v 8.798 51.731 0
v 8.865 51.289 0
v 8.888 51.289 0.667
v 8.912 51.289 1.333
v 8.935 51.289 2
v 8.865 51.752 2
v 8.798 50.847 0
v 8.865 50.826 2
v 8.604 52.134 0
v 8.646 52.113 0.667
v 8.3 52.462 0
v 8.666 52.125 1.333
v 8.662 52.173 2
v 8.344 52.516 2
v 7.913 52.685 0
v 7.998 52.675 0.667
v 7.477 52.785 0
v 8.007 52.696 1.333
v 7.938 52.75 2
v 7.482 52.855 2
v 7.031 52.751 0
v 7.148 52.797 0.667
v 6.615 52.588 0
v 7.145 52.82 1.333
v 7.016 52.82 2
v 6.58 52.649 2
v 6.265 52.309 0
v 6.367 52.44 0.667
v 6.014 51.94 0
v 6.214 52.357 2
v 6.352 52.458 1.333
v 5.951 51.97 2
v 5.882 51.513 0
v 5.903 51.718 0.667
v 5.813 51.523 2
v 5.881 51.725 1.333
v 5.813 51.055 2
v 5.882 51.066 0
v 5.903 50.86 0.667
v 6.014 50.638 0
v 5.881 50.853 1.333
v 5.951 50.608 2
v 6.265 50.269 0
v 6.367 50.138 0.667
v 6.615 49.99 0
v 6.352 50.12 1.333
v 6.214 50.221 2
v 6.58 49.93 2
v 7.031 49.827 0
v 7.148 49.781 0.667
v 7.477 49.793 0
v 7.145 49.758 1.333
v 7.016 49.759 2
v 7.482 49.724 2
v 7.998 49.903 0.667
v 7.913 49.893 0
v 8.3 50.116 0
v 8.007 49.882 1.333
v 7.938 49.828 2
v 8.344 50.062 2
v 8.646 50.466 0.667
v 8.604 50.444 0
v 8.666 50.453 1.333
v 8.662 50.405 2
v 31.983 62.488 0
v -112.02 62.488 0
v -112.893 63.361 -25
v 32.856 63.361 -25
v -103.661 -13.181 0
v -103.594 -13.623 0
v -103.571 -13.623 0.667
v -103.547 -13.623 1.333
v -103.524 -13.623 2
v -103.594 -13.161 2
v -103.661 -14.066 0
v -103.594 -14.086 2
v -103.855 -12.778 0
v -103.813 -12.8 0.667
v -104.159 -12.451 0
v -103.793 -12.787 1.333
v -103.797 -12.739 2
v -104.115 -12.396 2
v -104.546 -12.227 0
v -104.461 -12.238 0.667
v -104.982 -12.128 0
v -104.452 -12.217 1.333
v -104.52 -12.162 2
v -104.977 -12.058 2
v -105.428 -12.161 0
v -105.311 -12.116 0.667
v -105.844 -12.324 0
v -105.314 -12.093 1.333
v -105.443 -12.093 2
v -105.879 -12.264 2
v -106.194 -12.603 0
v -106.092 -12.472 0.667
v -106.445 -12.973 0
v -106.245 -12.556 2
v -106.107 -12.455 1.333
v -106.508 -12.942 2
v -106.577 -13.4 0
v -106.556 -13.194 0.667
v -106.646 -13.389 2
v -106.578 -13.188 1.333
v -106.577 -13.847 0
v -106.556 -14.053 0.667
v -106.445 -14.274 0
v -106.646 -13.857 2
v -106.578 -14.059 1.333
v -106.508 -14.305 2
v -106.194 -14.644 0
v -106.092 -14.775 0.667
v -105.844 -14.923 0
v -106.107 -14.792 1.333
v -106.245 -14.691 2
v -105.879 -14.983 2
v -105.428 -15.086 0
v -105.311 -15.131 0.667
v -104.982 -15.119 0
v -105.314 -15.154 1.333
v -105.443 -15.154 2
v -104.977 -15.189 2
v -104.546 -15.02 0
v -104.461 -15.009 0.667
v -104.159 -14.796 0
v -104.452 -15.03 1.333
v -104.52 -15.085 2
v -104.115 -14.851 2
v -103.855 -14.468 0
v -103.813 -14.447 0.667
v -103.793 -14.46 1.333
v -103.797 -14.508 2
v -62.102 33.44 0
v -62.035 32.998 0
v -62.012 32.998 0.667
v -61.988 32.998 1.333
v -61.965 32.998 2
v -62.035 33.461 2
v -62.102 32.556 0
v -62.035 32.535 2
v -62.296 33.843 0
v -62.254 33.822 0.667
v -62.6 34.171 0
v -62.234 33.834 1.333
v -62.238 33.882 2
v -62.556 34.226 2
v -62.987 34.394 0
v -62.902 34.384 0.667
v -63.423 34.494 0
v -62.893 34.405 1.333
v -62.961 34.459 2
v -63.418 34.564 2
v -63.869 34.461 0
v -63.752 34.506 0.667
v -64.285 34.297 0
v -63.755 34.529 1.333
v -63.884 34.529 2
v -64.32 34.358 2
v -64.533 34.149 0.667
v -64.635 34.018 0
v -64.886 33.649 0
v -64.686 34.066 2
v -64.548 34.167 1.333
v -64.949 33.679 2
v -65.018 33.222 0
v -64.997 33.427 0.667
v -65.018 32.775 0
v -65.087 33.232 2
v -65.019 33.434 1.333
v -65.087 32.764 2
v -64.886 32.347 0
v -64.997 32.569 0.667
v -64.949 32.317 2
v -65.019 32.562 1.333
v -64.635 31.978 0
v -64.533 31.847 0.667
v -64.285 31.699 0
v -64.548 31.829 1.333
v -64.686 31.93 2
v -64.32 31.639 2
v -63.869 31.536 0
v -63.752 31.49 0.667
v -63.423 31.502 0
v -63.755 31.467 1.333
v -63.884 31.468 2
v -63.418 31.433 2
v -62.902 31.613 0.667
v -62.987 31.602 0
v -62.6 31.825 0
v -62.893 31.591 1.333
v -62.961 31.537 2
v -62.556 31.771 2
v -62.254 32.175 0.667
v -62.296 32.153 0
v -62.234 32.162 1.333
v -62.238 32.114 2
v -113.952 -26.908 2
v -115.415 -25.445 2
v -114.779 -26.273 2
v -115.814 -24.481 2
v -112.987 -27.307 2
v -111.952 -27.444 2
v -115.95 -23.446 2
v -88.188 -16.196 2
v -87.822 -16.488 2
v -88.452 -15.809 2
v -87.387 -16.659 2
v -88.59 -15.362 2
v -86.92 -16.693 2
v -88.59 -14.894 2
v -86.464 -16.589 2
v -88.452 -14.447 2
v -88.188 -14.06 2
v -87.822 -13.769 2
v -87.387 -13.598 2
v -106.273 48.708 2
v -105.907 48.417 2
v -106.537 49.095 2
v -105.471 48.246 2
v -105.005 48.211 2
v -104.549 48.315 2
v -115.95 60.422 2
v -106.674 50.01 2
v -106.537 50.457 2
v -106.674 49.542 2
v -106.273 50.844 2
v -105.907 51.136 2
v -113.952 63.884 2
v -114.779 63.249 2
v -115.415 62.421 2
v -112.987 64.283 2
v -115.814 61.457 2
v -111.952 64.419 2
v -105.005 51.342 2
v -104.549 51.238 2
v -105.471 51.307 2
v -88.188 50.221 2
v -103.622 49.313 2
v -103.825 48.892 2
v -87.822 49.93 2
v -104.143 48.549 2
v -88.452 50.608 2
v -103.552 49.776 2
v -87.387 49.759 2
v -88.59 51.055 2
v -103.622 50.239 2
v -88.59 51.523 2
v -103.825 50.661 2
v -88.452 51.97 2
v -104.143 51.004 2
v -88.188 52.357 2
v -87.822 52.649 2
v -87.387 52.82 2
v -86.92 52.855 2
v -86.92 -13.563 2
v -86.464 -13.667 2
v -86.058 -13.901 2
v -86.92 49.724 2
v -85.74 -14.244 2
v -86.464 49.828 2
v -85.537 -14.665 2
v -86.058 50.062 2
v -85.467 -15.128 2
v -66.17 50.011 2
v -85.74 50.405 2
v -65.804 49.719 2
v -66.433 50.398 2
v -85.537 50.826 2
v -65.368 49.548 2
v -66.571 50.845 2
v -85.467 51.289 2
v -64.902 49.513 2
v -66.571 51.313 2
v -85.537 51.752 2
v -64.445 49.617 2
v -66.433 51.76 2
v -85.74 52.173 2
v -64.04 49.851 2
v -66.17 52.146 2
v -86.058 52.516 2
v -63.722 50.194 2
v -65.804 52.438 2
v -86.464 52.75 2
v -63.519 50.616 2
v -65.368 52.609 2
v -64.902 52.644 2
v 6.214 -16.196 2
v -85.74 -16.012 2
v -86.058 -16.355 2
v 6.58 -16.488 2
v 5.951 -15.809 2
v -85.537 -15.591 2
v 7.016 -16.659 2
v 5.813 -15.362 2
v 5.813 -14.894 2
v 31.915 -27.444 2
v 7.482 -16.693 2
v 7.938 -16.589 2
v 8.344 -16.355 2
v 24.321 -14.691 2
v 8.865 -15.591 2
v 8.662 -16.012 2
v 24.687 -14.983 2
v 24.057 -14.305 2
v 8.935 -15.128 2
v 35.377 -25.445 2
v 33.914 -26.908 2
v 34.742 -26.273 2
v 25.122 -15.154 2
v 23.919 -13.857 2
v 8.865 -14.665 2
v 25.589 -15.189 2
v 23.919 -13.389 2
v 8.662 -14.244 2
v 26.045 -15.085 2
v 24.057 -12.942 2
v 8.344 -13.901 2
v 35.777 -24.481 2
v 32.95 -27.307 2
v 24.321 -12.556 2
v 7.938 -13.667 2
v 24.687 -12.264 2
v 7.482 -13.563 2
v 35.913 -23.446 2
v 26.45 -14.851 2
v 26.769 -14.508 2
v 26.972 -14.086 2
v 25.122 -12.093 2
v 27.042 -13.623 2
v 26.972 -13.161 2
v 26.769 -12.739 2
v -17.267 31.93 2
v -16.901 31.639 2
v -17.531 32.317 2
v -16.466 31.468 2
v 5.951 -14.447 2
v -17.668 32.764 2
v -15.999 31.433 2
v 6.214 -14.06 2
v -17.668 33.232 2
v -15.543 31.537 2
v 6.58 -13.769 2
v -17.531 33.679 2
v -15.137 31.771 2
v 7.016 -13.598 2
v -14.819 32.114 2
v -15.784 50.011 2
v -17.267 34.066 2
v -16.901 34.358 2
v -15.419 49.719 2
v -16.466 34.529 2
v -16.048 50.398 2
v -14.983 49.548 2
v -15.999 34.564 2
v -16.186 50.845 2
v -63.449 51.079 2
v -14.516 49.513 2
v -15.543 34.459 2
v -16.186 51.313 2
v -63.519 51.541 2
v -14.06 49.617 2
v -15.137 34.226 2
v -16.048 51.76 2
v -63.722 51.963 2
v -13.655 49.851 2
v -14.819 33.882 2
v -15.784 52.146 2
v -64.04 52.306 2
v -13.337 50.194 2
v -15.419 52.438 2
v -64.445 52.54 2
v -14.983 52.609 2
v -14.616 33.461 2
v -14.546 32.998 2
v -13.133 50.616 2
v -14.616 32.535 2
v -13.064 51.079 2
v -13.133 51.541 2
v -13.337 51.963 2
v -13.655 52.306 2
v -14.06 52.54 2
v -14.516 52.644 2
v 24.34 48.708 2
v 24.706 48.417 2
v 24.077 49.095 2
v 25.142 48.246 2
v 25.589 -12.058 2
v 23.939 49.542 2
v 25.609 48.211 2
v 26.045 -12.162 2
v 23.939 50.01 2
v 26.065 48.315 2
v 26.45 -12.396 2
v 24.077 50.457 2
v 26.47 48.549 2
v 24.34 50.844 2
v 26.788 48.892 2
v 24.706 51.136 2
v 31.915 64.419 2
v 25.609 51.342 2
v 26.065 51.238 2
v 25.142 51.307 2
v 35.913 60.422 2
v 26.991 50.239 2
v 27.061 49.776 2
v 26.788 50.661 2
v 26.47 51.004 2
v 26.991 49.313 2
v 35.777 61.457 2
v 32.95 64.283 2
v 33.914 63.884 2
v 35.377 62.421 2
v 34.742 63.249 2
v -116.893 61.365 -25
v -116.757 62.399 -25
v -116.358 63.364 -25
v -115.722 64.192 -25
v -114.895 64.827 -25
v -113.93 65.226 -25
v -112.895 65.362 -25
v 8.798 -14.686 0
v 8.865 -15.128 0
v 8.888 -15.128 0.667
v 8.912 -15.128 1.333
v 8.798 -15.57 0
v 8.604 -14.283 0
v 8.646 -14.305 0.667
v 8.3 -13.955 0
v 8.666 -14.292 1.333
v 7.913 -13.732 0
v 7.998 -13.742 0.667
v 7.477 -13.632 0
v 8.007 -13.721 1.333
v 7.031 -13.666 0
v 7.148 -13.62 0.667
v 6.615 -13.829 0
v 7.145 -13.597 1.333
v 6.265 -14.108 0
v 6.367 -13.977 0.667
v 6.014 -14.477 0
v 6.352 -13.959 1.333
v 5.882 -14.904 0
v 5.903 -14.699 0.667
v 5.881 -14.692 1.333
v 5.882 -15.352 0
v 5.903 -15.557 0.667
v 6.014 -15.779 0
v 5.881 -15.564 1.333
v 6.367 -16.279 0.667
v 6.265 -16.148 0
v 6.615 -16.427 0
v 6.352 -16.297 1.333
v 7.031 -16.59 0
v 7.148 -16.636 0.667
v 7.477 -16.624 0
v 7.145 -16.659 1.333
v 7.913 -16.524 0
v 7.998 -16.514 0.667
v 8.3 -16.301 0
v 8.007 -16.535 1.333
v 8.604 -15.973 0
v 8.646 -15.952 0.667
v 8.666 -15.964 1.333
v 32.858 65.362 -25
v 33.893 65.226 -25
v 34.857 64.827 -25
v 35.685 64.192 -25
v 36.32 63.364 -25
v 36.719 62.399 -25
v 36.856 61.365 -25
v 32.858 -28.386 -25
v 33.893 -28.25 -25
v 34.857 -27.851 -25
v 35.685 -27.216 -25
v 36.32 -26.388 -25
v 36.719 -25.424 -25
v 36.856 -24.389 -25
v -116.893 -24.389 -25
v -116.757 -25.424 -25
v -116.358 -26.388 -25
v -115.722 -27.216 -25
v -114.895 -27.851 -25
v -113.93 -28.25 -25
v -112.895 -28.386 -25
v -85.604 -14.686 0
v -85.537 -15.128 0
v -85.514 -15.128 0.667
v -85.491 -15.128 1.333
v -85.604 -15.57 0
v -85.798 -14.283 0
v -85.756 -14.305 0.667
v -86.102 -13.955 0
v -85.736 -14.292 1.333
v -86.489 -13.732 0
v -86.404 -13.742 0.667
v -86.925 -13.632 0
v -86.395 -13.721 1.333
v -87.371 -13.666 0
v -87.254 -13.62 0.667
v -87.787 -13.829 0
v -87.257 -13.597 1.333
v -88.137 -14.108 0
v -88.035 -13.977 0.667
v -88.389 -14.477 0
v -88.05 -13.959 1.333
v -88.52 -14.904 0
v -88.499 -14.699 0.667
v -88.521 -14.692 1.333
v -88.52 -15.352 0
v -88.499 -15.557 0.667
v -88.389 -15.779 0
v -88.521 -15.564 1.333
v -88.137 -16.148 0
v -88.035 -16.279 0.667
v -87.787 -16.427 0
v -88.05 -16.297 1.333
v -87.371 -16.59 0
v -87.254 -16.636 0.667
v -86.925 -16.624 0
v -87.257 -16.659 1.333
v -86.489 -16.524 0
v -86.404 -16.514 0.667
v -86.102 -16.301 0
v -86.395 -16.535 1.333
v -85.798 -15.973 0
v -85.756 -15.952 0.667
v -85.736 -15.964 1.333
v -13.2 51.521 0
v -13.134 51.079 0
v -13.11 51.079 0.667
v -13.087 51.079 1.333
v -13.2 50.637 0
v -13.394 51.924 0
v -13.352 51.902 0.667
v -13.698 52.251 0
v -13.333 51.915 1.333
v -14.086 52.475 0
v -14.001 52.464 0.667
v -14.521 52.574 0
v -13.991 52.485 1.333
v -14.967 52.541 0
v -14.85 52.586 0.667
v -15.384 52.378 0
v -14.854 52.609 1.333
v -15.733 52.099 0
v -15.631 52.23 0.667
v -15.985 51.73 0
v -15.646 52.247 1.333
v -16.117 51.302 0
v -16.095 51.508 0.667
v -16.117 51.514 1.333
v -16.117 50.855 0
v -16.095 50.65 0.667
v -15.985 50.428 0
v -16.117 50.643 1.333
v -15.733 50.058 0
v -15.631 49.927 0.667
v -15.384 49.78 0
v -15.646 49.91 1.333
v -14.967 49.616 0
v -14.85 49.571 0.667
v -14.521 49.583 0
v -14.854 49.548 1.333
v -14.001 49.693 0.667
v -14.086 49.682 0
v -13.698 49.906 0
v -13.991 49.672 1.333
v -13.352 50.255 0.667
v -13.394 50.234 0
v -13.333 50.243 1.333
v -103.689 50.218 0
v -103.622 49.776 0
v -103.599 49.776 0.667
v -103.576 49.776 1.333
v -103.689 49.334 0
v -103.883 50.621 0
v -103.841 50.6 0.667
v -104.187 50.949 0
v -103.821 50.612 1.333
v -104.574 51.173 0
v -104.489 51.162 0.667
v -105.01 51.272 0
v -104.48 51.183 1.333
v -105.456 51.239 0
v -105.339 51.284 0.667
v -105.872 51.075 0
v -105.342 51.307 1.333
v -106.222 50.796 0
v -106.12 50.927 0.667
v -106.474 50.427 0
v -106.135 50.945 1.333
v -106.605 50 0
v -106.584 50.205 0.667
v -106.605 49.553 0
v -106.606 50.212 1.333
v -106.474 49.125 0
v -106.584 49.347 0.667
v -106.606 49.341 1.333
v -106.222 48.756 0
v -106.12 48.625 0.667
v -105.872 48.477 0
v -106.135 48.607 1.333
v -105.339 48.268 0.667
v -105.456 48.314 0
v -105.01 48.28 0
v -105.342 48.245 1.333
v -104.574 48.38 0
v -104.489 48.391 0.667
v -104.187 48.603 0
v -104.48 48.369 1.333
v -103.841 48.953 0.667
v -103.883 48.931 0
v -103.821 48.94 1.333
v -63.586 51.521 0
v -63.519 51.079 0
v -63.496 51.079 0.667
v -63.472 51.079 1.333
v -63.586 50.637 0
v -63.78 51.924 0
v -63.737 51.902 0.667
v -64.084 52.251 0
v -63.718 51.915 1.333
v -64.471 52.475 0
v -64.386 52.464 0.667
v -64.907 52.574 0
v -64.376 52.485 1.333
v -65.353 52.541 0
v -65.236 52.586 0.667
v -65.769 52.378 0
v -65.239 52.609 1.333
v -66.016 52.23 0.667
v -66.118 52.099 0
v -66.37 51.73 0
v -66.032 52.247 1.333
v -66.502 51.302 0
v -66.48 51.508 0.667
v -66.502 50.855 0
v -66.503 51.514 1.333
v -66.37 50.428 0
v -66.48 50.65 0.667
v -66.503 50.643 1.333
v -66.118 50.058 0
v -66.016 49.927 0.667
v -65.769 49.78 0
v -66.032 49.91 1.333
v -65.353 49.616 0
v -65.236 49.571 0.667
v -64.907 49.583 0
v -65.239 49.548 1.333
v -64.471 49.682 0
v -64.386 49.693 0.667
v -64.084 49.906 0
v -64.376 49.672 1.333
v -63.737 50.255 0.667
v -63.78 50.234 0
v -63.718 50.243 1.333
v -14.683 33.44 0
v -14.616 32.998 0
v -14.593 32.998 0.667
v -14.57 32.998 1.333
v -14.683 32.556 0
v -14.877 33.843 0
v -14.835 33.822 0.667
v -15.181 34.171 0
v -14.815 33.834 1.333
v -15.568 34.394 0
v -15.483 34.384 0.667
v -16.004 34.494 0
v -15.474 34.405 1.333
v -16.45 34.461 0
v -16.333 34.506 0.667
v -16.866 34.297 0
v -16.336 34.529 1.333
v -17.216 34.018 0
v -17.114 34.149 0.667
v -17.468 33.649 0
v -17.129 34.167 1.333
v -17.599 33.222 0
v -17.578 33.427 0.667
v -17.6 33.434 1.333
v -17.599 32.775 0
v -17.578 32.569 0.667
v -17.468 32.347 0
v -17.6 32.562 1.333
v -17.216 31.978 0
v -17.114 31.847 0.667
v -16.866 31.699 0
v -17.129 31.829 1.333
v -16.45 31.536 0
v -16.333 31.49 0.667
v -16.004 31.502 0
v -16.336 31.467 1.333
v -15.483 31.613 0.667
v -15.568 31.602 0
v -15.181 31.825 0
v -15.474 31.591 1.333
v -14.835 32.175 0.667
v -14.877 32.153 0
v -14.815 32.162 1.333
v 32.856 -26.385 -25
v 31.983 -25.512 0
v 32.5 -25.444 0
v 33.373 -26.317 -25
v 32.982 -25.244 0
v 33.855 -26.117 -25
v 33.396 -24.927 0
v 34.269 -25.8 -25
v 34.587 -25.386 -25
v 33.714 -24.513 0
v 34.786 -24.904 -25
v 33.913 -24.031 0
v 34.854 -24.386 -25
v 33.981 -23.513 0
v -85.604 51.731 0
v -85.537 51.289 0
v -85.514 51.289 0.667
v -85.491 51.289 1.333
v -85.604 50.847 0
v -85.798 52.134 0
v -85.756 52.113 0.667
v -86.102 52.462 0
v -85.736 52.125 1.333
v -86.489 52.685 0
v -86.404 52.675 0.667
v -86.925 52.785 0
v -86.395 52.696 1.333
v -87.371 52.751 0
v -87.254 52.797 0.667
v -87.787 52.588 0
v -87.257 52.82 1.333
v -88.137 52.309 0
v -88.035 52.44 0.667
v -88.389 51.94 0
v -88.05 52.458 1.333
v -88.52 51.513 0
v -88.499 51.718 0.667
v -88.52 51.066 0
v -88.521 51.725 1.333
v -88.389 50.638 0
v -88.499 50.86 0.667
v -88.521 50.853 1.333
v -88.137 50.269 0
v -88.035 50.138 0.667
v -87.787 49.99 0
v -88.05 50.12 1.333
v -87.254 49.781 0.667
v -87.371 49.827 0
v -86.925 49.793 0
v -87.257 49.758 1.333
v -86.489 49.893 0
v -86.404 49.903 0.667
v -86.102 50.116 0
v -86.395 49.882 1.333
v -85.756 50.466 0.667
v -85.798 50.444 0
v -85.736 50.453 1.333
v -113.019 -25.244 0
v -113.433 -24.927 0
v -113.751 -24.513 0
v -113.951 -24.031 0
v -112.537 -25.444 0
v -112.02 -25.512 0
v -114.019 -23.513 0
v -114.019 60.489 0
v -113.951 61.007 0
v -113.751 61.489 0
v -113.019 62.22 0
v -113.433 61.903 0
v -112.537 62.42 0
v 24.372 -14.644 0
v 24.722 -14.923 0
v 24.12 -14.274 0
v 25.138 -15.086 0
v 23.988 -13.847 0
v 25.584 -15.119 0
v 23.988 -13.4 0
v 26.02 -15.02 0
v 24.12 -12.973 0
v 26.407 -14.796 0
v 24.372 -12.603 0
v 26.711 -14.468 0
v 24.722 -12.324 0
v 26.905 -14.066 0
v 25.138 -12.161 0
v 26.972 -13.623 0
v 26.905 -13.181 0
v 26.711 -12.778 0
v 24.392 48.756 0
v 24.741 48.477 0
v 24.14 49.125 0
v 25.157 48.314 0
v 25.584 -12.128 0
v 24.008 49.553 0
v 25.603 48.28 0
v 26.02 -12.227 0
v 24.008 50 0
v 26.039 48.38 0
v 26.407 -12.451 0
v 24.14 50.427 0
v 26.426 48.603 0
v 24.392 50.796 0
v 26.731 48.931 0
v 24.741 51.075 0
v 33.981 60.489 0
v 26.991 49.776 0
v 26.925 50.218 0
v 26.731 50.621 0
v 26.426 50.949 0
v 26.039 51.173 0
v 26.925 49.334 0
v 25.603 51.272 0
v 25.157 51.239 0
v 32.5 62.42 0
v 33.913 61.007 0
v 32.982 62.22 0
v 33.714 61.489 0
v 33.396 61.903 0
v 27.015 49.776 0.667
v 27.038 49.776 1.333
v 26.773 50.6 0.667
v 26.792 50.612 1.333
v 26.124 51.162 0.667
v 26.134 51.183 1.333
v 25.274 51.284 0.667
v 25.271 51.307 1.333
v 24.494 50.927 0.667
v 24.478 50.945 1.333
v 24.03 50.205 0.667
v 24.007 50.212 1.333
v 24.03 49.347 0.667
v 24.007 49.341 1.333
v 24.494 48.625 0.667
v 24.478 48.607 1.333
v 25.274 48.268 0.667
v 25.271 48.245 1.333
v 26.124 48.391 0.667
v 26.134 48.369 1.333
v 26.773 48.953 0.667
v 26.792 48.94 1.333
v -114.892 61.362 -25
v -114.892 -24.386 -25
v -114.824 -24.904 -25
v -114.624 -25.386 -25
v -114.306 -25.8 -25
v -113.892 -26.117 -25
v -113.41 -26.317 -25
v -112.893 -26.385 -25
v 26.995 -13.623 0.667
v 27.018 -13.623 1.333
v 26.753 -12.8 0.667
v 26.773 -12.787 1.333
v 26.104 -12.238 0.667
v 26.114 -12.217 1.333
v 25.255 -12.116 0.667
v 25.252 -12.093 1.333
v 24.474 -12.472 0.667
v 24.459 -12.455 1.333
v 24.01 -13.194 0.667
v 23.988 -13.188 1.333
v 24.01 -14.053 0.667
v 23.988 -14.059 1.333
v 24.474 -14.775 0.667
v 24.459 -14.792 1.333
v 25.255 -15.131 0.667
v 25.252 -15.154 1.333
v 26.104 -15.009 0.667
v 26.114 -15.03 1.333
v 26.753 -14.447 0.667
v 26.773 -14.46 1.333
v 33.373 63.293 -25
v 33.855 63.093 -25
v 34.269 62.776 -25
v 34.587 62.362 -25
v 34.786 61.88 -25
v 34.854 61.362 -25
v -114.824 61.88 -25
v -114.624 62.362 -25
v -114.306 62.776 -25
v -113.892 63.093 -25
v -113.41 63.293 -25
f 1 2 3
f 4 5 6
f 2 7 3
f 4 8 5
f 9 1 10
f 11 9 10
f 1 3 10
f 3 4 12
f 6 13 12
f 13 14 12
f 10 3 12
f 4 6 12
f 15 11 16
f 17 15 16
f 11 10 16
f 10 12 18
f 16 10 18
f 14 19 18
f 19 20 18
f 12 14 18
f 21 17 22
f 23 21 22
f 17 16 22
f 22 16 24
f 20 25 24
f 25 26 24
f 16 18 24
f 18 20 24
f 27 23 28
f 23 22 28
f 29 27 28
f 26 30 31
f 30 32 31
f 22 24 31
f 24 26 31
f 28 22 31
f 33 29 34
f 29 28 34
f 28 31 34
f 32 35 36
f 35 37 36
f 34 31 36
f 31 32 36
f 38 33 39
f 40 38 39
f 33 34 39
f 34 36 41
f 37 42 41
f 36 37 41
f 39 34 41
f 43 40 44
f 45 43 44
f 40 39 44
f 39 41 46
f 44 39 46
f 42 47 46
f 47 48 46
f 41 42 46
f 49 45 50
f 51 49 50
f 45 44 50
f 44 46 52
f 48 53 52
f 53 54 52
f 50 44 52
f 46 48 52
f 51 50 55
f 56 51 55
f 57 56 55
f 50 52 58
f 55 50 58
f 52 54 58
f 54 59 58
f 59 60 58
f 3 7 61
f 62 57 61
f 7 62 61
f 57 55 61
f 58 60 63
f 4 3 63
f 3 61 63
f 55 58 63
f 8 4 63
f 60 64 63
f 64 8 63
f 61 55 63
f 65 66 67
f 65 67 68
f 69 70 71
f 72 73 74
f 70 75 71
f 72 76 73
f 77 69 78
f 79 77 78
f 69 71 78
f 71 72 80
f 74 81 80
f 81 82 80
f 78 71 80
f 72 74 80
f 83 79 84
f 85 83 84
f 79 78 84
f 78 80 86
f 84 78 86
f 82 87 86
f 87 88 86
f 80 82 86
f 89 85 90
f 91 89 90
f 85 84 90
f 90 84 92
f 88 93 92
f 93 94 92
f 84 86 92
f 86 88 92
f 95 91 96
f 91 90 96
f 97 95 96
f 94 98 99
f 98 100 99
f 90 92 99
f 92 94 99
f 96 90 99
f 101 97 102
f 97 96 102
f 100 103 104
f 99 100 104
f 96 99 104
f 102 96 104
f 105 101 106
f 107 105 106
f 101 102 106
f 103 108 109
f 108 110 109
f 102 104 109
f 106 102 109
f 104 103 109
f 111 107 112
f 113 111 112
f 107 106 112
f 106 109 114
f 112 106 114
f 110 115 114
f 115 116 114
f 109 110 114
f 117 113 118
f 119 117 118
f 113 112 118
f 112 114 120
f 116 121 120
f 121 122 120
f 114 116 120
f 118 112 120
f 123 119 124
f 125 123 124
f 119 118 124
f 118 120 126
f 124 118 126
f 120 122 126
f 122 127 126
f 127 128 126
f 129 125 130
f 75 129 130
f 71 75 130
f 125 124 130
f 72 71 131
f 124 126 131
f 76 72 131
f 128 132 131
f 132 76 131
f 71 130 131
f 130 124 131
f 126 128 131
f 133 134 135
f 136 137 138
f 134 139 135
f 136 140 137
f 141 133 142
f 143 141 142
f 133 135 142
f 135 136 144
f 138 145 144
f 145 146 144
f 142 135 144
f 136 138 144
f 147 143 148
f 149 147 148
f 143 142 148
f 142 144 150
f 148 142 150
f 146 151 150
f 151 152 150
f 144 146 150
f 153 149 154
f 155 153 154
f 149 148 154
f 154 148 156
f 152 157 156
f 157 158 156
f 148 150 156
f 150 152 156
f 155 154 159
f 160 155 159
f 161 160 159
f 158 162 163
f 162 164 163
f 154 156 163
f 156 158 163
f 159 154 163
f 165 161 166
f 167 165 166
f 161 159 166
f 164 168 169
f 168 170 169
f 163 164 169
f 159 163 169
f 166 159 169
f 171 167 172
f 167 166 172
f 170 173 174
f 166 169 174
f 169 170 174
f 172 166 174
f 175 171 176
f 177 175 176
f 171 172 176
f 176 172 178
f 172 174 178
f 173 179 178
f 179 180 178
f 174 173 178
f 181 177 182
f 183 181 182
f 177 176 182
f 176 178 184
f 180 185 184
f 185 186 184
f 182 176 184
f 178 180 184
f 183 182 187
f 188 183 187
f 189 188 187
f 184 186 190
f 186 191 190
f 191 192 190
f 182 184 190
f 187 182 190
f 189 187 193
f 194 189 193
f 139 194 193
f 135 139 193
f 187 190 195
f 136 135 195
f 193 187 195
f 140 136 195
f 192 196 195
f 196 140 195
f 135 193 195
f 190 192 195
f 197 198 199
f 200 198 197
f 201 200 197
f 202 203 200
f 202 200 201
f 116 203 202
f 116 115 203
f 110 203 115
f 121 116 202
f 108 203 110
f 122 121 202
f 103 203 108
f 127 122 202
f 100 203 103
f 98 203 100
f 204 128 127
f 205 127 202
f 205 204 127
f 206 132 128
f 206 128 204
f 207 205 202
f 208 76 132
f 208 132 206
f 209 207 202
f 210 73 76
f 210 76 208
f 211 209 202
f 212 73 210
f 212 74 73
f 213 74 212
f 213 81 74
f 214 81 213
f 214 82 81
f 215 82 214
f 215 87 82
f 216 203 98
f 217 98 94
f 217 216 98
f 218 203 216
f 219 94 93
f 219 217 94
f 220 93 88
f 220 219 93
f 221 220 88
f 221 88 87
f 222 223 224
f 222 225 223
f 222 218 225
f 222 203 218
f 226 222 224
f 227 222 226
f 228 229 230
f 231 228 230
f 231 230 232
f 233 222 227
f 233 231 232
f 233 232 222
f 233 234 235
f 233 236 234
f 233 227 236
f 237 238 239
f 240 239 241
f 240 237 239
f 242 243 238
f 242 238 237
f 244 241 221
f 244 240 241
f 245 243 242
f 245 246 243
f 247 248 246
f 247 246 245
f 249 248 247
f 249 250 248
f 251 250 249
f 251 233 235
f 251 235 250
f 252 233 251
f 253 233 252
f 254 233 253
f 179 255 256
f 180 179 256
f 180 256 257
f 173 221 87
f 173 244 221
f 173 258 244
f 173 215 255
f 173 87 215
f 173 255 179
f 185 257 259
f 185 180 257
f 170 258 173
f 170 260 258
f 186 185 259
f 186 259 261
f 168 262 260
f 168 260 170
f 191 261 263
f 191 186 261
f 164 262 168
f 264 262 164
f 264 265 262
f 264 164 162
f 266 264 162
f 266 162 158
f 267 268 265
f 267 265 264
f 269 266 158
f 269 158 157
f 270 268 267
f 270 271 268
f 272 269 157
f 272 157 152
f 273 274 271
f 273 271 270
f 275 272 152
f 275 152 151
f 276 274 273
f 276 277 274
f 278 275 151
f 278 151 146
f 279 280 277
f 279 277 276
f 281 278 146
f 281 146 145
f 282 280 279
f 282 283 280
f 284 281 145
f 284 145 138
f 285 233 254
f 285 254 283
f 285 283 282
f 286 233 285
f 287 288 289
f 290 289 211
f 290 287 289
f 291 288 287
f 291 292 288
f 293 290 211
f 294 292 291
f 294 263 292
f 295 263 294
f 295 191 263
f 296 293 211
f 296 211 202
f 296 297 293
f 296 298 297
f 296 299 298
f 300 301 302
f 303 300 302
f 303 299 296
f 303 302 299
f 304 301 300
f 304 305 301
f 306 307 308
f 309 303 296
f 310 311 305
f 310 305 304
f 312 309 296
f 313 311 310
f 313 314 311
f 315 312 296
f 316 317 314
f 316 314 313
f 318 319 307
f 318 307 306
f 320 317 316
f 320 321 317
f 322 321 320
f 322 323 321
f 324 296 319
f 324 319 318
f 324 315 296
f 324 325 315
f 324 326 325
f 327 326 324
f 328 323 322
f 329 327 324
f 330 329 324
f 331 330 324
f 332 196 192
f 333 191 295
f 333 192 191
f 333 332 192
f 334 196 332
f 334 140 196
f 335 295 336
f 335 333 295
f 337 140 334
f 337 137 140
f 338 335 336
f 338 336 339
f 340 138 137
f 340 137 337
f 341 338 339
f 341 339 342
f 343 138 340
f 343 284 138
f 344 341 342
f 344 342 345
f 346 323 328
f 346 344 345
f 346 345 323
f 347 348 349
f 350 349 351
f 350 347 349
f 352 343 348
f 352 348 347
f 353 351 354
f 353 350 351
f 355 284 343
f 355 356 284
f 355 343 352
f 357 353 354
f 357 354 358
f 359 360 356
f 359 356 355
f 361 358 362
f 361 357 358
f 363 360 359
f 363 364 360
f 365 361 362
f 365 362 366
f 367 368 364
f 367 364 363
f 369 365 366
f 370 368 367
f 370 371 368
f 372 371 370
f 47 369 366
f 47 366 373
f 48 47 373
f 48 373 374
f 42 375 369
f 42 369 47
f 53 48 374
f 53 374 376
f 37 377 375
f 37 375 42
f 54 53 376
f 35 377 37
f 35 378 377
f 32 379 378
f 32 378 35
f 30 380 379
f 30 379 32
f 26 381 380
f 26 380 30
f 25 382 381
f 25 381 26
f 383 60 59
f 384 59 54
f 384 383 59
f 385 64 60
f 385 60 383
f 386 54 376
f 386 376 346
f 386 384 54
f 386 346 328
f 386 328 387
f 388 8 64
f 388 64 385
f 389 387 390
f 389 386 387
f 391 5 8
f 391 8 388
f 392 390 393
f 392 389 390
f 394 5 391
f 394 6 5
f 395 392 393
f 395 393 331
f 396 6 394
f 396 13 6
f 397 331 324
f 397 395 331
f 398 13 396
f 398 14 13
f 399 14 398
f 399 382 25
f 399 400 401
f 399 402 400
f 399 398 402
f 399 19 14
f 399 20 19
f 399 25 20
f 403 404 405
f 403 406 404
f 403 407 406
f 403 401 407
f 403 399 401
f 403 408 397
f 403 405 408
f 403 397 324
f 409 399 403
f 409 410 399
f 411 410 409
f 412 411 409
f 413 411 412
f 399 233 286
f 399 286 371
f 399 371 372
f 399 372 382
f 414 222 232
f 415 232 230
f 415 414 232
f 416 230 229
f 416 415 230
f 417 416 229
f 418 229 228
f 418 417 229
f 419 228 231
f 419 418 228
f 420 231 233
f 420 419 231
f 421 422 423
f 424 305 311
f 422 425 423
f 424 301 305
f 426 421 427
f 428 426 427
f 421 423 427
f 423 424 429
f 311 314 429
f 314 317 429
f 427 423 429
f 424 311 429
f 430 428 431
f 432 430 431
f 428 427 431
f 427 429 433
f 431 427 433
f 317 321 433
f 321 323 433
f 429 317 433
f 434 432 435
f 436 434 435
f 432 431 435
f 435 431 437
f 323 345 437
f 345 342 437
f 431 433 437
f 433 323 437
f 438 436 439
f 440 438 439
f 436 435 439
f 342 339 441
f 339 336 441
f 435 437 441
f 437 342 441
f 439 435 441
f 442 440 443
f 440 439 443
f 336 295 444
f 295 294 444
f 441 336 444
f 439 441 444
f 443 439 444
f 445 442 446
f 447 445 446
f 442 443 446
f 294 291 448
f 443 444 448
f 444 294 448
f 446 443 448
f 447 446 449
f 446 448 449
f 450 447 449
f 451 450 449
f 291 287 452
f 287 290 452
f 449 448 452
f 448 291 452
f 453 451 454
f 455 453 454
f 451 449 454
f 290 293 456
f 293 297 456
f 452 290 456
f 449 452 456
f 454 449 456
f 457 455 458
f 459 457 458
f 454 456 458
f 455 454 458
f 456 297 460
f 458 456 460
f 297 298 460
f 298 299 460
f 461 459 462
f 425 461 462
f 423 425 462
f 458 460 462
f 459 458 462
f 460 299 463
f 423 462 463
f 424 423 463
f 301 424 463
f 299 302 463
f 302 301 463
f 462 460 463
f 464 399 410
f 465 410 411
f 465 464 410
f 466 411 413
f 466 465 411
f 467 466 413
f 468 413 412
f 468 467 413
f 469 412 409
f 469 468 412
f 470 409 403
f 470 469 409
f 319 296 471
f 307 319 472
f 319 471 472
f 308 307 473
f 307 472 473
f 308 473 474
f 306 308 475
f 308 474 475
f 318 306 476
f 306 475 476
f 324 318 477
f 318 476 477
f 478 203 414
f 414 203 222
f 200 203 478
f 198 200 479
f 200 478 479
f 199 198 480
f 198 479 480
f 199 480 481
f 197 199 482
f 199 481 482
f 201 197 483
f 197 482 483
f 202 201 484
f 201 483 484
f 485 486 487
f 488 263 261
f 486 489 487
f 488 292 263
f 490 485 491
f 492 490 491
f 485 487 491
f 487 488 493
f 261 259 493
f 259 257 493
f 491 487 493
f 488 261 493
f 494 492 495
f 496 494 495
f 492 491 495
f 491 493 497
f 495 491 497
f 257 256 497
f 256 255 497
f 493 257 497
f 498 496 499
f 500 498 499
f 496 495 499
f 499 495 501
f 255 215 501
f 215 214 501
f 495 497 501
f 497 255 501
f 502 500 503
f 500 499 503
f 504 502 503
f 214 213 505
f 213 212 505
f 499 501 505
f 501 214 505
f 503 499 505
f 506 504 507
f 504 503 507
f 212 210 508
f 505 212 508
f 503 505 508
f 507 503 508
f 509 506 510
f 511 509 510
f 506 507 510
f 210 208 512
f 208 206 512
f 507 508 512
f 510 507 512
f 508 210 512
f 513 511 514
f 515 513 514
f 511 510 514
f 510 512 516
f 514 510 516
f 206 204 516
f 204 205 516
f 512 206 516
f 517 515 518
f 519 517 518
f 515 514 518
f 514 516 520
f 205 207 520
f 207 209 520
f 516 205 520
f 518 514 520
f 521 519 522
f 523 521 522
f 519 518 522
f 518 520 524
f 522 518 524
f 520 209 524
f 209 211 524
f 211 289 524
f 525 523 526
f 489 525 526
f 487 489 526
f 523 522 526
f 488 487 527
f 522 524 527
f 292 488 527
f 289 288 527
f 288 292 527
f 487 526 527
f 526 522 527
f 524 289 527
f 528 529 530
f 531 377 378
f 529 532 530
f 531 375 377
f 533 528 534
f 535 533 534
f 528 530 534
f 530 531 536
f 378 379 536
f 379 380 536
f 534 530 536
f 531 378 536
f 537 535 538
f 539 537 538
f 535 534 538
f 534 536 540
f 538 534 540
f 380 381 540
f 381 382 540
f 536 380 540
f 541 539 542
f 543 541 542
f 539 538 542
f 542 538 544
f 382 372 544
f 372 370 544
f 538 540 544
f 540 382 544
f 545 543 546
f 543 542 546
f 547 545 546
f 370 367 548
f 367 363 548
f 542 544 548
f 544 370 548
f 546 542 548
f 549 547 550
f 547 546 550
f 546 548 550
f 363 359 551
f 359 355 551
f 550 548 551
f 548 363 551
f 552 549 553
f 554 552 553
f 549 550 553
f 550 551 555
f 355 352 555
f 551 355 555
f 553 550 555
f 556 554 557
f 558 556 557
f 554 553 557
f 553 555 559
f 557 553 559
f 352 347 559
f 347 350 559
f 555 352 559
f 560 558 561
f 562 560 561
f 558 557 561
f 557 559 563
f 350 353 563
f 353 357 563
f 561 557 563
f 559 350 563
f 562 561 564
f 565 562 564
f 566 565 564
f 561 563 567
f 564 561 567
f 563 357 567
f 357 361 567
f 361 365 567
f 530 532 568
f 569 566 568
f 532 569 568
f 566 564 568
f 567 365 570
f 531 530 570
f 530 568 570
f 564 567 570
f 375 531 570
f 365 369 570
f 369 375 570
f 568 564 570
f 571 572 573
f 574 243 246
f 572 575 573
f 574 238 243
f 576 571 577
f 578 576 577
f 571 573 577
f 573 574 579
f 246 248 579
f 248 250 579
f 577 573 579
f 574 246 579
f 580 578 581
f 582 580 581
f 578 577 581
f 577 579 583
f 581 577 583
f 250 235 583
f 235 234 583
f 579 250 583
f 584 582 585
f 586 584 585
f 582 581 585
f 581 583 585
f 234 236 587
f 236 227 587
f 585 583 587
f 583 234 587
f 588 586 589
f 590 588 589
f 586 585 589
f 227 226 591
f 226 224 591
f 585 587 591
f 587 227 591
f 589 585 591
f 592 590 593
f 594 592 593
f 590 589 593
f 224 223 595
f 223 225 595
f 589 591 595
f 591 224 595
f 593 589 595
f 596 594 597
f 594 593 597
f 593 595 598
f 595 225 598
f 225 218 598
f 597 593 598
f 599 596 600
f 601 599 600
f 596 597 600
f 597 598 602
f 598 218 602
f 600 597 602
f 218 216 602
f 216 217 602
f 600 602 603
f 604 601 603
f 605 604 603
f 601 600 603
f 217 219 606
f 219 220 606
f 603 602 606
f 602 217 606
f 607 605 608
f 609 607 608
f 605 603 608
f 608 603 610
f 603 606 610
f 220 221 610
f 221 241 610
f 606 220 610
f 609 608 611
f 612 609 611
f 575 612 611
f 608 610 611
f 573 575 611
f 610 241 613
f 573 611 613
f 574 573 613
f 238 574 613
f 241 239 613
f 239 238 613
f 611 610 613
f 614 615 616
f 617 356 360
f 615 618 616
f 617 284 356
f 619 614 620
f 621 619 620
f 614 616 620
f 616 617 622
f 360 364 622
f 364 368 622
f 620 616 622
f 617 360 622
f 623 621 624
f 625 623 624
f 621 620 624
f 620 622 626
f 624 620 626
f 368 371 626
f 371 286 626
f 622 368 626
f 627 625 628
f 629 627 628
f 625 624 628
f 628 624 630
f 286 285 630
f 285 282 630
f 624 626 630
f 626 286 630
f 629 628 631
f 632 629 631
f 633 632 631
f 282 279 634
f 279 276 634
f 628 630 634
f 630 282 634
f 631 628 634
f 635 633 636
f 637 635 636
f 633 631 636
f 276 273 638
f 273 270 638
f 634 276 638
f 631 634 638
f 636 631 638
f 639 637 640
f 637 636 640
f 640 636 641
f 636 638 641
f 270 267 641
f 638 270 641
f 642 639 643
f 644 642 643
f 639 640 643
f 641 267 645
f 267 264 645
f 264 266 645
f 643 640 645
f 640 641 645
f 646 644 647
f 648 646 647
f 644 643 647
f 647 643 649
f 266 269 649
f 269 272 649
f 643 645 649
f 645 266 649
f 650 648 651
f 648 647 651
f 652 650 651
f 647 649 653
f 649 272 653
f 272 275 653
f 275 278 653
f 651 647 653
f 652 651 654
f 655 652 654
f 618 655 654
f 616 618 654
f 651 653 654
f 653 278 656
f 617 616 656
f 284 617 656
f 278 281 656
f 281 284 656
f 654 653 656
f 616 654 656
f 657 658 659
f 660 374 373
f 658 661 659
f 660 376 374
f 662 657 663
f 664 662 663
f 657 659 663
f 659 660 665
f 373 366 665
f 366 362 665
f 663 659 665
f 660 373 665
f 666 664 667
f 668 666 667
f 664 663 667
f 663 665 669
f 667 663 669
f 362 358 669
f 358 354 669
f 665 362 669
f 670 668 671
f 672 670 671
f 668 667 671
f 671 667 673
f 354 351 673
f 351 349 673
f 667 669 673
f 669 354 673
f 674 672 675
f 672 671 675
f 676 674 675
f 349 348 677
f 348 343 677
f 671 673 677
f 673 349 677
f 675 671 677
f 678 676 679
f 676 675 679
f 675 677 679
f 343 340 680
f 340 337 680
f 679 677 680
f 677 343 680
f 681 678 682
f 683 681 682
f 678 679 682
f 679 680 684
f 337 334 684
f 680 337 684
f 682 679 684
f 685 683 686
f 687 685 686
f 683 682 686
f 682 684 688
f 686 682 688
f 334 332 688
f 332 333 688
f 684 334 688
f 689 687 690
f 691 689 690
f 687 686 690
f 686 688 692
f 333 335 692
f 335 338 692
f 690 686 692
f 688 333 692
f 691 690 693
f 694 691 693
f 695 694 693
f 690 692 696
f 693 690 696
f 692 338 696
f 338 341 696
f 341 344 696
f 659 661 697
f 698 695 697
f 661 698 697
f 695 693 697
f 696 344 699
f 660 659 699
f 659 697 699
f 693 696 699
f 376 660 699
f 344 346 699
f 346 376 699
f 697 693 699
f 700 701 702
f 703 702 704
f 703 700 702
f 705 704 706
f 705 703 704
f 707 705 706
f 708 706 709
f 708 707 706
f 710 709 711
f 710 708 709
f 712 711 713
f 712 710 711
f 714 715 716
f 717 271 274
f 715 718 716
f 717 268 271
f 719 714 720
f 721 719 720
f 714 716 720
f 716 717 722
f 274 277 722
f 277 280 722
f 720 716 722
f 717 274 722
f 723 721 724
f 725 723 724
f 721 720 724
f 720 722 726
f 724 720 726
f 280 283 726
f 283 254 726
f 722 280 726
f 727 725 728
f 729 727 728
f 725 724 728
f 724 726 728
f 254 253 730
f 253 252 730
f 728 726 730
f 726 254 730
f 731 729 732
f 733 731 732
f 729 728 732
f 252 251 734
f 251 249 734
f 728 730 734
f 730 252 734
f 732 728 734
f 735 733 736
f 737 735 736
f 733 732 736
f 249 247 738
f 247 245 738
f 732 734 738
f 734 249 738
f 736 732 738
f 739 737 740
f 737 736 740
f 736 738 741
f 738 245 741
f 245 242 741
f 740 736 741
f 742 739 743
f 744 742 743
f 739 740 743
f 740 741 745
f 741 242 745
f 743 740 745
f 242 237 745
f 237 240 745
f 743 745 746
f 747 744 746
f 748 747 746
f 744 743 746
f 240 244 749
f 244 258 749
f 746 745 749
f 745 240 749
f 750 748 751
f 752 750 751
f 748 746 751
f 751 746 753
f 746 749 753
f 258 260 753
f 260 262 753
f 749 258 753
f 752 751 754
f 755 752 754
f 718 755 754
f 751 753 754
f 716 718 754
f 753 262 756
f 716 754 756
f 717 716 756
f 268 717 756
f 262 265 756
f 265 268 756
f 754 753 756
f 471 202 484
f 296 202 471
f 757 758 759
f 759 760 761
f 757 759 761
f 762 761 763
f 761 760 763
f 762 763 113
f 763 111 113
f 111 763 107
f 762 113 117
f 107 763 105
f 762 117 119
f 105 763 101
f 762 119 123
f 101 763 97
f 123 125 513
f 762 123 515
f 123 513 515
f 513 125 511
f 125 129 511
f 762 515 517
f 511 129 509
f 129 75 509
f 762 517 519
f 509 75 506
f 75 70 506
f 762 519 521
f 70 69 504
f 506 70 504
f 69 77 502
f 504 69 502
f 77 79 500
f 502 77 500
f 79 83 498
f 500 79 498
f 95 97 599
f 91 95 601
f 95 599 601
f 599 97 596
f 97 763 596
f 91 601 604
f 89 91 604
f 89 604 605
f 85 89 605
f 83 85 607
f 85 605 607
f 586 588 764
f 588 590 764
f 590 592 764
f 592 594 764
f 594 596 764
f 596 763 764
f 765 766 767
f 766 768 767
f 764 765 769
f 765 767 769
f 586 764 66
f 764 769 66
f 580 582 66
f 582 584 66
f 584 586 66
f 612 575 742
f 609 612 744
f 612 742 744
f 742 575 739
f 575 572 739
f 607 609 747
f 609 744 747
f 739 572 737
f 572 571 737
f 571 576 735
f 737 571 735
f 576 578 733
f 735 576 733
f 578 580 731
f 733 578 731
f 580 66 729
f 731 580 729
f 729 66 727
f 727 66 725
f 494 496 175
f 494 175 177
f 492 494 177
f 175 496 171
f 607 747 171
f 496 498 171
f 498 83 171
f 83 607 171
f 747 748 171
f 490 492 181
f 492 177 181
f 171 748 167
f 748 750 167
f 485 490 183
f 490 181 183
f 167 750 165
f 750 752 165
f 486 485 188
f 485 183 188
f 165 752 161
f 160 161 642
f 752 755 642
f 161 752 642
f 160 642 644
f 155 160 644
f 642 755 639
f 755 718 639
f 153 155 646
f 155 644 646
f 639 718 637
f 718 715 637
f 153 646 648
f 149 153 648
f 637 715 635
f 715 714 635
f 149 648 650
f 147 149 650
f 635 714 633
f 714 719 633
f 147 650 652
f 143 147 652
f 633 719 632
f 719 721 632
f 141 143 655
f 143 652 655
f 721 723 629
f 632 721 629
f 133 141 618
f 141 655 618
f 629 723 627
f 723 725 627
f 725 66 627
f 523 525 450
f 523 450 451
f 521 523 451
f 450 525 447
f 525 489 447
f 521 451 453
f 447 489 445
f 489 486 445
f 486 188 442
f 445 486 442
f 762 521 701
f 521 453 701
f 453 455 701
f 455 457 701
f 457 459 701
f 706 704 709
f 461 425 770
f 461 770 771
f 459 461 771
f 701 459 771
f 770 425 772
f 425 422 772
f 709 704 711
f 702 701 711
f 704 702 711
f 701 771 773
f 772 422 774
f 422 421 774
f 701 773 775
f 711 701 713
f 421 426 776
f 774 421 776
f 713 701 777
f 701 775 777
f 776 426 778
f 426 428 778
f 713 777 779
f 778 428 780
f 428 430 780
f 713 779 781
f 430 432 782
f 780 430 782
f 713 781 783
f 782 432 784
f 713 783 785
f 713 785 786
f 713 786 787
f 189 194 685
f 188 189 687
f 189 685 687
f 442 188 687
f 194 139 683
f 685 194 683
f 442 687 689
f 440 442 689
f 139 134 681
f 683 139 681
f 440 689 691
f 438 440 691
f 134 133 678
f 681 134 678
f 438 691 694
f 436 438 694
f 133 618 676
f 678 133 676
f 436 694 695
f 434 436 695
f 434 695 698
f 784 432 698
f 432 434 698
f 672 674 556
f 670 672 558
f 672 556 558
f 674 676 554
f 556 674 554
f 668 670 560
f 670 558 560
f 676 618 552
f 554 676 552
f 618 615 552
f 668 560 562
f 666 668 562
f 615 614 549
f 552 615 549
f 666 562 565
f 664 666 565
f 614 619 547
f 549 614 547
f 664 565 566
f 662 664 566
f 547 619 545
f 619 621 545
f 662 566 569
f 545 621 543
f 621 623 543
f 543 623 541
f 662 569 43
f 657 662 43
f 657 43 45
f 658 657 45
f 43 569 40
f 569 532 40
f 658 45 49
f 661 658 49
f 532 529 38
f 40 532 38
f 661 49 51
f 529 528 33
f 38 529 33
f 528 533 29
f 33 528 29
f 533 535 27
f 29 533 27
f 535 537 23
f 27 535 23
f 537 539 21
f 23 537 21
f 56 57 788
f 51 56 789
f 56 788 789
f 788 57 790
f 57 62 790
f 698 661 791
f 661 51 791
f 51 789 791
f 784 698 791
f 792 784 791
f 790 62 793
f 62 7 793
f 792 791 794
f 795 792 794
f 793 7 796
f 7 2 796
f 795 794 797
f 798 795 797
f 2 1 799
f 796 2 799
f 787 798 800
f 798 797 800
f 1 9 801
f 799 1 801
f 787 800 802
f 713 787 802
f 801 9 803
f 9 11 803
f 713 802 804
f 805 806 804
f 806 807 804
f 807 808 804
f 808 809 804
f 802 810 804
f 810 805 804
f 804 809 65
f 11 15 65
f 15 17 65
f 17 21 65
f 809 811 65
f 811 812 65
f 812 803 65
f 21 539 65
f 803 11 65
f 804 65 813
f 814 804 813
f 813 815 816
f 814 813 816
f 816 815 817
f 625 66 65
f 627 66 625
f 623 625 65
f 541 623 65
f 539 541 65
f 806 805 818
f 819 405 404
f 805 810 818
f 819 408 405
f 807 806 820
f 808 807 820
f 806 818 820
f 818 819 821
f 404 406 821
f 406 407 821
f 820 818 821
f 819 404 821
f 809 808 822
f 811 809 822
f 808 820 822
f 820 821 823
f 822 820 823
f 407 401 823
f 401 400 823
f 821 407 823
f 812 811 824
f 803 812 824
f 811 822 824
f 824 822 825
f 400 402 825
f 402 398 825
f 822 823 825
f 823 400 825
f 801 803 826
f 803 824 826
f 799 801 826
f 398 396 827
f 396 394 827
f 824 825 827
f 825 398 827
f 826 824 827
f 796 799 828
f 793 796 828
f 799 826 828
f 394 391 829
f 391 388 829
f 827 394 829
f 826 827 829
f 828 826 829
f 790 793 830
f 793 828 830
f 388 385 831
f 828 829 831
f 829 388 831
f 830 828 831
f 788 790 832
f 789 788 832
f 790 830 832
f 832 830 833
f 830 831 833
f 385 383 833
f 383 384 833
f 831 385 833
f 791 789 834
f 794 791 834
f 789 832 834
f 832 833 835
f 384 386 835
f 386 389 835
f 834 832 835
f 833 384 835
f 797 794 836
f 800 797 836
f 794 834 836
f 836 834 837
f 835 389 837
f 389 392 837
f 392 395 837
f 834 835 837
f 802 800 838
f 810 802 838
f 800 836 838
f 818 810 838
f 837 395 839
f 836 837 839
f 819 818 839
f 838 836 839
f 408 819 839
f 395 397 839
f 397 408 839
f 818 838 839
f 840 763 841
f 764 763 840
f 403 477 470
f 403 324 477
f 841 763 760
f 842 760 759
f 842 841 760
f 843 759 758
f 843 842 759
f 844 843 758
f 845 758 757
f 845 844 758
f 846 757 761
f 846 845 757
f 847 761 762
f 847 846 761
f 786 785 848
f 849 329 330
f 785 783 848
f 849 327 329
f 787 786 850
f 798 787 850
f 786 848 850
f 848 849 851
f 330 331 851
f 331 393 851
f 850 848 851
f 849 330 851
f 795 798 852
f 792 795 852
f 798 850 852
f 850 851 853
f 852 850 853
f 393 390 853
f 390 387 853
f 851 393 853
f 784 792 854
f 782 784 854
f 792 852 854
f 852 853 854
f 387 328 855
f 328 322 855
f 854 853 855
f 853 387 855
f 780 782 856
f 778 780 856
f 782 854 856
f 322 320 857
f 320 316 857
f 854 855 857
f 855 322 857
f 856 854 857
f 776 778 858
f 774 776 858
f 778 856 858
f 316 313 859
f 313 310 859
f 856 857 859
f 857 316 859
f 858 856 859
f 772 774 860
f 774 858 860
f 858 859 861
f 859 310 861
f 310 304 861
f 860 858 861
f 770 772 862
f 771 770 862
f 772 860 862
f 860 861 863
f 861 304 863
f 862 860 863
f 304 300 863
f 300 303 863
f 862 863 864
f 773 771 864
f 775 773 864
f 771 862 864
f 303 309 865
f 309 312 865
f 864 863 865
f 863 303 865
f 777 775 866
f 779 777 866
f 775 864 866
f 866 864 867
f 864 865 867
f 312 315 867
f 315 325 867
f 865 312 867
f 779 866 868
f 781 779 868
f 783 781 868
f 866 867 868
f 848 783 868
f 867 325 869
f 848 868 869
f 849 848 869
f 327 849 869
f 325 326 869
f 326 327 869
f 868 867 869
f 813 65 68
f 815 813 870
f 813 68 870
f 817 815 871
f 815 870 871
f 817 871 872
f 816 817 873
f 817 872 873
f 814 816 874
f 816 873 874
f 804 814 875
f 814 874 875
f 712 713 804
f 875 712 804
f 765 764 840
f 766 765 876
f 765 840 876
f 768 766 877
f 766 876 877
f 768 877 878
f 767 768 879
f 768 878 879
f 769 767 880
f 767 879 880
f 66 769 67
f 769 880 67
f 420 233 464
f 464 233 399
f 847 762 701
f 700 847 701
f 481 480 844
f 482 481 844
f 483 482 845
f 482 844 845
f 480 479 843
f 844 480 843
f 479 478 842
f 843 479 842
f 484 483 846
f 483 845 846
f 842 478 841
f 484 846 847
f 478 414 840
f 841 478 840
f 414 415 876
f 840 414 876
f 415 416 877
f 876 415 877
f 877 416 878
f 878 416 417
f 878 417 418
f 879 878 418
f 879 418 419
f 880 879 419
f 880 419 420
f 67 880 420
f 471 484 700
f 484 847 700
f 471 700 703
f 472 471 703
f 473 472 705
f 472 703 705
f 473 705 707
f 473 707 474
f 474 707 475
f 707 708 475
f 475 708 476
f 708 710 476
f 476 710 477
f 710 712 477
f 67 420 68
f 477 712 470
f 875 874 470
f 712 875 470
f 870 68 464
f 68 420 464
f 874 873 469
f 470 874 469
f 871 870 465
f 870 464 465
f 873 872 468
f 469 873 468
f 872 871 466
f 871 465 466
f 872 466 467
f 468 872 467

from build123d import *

# Parameters (mm, degrees)
SKETCH_1_W      = 148
SKETCH_1_H      = 88
SKETCH_1_R      = 1.5
EXTRUDE_1_DEPTH = 25
EXTRUDE_1_DRAFT = 2
FILLET_1_R      = 2
SHELL_1_T       = 2


with BuildPart() as part:
    # Эскиз1 → Бобышка-Вытянуть1 (with draft: the straight prism first)
    with BuildSketch(Plane.XY):
        with Locations((-40.018678, 18.487832)):
            Rectangle(SKETCH_1_W, SKETCH_1_H)
        with Locations((7.364962, 51.289097)):
            Circle(SKETCH_1_R, mode=Mode.SUBTRACT)
        with Locations((25.491262, 49.776217)):
            Circle(SKETCH_1_R, mode=Mode.SUBTRACT)
        with Locations((25.471663, -13.623467)):
            Circle(SKETCH_1_R, mode=Mode.SUBTRACT)
        with Locations((7.364962, -15.128048)):
            Circle(SKETCH_1_R, mode=Mode.SUBTRACT)
        with Locations((-14.633582, 51.078679)):
            Circle(SKETCH_1_R, mode=Mode.SUBTRACT)
        with Locations((-16.116192, 32.998149)):
            Circle(SKETCH_1_R, mode=Mode.SUBTRACT)
        with Locations((-65.018894, 51.078679)):
            Circle(SKETCH_1_R, mode=Mode.SUBTRACT)
        with Locations((-63.53497, 32.998149)):
            Circle(SKETCH_1_R, mode=Mode.SUBTRACT)
        with Locations((-87.0372, 51.289097)):
            Circle(SKETCH_1_R, mode=Mode.SUBTRACT)
        with Locations((-105.122155, 49.776217)):
            Circle(SKETCH_1_R, mode=Mode.SUBTRACT)
        with Locations((-87.0372, -15.128048)):
            Circle(SKETCH_1_R, mode=Mode.SUBTRACT)
        with Locations((-105.094004, -13.623467)):
            Circle(SKETCH_1_R, mode=Mode.SUBTRACT)
    extrude(amount=-EXTRUDE_1_DEPTH)
    # Бобышка-Вытянуть1: the draft: its side faces are tilted about the plane it starts from
    extrude_1_sides = [part.faces().sort_by_distance(p)[0] for p in [
        (-40.018678, 62.487832, -12.5),
        (-114.018678, 18.487832, -12.5),
        (-40.018678, -25.512168, -12.5),
        (33.981322, 18.487832, -12.5),
        (5.864962, 51.289097, -12.5),
        (23.991262, 49.776217, -12.5),
        (23.971663, -13.623467, -12.5),
        (5.864962, -15.128048, -12.5),
        (-16.133582, 51.078679, -12.5),
        (-17.616192, 32.998149, -12.5),
        (-66.518894, 51.078679, -12.5),
        (-65.03497, 32.998149, -12.5),
        (-88.5372, 51.289097, -12.5),
        (-106.622155, 49.776217, -12.5),
        (-88.5372, -15.128048, -12.5),
        (-106.594004, -13.623467, -12.5),
    ]]
    draft(extrude_1_sides, Plane.XY, EXTRUDE_1_DRAFT)

    # Скругление1
    fillet_1_edges = [part.edges().sort_by_distance(p)[0] for p in [
        (34.417831, -25.948678, -12.5),
        (-114.455188, -25.948678, -12.5),
        (-114.455188, 62.924342, -12.5),
        (34.417831, 62.924342, -12.5),
    ]]
    fillet(fillet_1_edges, radius=FILLET_1_R)

    # Оболочка1
    shell_1_openings = [part.faces().sort_by_distance(p)[0] for p in [
        (-40.018892, 18.479465, -25),
        (6.301471, 51.289097, -12.5),
        (24.427772, 49.776217, -12.5),
        (24.408173, -13.623467, -12.5),
        (6.301471, -15.128048, -12.5),
        (-15.697073, 51.078679, -12.5),
        (-17.179682, 32.998149, -12.5),
        (-66.082384, 51.078679, -12.5),
        (-64.59846, 32.998149, -12.5),
        (-88.10069, 51.289097, -12.5),
        (-106.185646, 49.776217, -12.5),
        (-88.10069, -15.128048, -12.5),
        (-106.157495, -13.623467, -12.5),
    ]]
    offset(amount=SHELL_1_T, openings=shell_1_openings, kind=Kind.INTERSECTION)


solid = part.part
